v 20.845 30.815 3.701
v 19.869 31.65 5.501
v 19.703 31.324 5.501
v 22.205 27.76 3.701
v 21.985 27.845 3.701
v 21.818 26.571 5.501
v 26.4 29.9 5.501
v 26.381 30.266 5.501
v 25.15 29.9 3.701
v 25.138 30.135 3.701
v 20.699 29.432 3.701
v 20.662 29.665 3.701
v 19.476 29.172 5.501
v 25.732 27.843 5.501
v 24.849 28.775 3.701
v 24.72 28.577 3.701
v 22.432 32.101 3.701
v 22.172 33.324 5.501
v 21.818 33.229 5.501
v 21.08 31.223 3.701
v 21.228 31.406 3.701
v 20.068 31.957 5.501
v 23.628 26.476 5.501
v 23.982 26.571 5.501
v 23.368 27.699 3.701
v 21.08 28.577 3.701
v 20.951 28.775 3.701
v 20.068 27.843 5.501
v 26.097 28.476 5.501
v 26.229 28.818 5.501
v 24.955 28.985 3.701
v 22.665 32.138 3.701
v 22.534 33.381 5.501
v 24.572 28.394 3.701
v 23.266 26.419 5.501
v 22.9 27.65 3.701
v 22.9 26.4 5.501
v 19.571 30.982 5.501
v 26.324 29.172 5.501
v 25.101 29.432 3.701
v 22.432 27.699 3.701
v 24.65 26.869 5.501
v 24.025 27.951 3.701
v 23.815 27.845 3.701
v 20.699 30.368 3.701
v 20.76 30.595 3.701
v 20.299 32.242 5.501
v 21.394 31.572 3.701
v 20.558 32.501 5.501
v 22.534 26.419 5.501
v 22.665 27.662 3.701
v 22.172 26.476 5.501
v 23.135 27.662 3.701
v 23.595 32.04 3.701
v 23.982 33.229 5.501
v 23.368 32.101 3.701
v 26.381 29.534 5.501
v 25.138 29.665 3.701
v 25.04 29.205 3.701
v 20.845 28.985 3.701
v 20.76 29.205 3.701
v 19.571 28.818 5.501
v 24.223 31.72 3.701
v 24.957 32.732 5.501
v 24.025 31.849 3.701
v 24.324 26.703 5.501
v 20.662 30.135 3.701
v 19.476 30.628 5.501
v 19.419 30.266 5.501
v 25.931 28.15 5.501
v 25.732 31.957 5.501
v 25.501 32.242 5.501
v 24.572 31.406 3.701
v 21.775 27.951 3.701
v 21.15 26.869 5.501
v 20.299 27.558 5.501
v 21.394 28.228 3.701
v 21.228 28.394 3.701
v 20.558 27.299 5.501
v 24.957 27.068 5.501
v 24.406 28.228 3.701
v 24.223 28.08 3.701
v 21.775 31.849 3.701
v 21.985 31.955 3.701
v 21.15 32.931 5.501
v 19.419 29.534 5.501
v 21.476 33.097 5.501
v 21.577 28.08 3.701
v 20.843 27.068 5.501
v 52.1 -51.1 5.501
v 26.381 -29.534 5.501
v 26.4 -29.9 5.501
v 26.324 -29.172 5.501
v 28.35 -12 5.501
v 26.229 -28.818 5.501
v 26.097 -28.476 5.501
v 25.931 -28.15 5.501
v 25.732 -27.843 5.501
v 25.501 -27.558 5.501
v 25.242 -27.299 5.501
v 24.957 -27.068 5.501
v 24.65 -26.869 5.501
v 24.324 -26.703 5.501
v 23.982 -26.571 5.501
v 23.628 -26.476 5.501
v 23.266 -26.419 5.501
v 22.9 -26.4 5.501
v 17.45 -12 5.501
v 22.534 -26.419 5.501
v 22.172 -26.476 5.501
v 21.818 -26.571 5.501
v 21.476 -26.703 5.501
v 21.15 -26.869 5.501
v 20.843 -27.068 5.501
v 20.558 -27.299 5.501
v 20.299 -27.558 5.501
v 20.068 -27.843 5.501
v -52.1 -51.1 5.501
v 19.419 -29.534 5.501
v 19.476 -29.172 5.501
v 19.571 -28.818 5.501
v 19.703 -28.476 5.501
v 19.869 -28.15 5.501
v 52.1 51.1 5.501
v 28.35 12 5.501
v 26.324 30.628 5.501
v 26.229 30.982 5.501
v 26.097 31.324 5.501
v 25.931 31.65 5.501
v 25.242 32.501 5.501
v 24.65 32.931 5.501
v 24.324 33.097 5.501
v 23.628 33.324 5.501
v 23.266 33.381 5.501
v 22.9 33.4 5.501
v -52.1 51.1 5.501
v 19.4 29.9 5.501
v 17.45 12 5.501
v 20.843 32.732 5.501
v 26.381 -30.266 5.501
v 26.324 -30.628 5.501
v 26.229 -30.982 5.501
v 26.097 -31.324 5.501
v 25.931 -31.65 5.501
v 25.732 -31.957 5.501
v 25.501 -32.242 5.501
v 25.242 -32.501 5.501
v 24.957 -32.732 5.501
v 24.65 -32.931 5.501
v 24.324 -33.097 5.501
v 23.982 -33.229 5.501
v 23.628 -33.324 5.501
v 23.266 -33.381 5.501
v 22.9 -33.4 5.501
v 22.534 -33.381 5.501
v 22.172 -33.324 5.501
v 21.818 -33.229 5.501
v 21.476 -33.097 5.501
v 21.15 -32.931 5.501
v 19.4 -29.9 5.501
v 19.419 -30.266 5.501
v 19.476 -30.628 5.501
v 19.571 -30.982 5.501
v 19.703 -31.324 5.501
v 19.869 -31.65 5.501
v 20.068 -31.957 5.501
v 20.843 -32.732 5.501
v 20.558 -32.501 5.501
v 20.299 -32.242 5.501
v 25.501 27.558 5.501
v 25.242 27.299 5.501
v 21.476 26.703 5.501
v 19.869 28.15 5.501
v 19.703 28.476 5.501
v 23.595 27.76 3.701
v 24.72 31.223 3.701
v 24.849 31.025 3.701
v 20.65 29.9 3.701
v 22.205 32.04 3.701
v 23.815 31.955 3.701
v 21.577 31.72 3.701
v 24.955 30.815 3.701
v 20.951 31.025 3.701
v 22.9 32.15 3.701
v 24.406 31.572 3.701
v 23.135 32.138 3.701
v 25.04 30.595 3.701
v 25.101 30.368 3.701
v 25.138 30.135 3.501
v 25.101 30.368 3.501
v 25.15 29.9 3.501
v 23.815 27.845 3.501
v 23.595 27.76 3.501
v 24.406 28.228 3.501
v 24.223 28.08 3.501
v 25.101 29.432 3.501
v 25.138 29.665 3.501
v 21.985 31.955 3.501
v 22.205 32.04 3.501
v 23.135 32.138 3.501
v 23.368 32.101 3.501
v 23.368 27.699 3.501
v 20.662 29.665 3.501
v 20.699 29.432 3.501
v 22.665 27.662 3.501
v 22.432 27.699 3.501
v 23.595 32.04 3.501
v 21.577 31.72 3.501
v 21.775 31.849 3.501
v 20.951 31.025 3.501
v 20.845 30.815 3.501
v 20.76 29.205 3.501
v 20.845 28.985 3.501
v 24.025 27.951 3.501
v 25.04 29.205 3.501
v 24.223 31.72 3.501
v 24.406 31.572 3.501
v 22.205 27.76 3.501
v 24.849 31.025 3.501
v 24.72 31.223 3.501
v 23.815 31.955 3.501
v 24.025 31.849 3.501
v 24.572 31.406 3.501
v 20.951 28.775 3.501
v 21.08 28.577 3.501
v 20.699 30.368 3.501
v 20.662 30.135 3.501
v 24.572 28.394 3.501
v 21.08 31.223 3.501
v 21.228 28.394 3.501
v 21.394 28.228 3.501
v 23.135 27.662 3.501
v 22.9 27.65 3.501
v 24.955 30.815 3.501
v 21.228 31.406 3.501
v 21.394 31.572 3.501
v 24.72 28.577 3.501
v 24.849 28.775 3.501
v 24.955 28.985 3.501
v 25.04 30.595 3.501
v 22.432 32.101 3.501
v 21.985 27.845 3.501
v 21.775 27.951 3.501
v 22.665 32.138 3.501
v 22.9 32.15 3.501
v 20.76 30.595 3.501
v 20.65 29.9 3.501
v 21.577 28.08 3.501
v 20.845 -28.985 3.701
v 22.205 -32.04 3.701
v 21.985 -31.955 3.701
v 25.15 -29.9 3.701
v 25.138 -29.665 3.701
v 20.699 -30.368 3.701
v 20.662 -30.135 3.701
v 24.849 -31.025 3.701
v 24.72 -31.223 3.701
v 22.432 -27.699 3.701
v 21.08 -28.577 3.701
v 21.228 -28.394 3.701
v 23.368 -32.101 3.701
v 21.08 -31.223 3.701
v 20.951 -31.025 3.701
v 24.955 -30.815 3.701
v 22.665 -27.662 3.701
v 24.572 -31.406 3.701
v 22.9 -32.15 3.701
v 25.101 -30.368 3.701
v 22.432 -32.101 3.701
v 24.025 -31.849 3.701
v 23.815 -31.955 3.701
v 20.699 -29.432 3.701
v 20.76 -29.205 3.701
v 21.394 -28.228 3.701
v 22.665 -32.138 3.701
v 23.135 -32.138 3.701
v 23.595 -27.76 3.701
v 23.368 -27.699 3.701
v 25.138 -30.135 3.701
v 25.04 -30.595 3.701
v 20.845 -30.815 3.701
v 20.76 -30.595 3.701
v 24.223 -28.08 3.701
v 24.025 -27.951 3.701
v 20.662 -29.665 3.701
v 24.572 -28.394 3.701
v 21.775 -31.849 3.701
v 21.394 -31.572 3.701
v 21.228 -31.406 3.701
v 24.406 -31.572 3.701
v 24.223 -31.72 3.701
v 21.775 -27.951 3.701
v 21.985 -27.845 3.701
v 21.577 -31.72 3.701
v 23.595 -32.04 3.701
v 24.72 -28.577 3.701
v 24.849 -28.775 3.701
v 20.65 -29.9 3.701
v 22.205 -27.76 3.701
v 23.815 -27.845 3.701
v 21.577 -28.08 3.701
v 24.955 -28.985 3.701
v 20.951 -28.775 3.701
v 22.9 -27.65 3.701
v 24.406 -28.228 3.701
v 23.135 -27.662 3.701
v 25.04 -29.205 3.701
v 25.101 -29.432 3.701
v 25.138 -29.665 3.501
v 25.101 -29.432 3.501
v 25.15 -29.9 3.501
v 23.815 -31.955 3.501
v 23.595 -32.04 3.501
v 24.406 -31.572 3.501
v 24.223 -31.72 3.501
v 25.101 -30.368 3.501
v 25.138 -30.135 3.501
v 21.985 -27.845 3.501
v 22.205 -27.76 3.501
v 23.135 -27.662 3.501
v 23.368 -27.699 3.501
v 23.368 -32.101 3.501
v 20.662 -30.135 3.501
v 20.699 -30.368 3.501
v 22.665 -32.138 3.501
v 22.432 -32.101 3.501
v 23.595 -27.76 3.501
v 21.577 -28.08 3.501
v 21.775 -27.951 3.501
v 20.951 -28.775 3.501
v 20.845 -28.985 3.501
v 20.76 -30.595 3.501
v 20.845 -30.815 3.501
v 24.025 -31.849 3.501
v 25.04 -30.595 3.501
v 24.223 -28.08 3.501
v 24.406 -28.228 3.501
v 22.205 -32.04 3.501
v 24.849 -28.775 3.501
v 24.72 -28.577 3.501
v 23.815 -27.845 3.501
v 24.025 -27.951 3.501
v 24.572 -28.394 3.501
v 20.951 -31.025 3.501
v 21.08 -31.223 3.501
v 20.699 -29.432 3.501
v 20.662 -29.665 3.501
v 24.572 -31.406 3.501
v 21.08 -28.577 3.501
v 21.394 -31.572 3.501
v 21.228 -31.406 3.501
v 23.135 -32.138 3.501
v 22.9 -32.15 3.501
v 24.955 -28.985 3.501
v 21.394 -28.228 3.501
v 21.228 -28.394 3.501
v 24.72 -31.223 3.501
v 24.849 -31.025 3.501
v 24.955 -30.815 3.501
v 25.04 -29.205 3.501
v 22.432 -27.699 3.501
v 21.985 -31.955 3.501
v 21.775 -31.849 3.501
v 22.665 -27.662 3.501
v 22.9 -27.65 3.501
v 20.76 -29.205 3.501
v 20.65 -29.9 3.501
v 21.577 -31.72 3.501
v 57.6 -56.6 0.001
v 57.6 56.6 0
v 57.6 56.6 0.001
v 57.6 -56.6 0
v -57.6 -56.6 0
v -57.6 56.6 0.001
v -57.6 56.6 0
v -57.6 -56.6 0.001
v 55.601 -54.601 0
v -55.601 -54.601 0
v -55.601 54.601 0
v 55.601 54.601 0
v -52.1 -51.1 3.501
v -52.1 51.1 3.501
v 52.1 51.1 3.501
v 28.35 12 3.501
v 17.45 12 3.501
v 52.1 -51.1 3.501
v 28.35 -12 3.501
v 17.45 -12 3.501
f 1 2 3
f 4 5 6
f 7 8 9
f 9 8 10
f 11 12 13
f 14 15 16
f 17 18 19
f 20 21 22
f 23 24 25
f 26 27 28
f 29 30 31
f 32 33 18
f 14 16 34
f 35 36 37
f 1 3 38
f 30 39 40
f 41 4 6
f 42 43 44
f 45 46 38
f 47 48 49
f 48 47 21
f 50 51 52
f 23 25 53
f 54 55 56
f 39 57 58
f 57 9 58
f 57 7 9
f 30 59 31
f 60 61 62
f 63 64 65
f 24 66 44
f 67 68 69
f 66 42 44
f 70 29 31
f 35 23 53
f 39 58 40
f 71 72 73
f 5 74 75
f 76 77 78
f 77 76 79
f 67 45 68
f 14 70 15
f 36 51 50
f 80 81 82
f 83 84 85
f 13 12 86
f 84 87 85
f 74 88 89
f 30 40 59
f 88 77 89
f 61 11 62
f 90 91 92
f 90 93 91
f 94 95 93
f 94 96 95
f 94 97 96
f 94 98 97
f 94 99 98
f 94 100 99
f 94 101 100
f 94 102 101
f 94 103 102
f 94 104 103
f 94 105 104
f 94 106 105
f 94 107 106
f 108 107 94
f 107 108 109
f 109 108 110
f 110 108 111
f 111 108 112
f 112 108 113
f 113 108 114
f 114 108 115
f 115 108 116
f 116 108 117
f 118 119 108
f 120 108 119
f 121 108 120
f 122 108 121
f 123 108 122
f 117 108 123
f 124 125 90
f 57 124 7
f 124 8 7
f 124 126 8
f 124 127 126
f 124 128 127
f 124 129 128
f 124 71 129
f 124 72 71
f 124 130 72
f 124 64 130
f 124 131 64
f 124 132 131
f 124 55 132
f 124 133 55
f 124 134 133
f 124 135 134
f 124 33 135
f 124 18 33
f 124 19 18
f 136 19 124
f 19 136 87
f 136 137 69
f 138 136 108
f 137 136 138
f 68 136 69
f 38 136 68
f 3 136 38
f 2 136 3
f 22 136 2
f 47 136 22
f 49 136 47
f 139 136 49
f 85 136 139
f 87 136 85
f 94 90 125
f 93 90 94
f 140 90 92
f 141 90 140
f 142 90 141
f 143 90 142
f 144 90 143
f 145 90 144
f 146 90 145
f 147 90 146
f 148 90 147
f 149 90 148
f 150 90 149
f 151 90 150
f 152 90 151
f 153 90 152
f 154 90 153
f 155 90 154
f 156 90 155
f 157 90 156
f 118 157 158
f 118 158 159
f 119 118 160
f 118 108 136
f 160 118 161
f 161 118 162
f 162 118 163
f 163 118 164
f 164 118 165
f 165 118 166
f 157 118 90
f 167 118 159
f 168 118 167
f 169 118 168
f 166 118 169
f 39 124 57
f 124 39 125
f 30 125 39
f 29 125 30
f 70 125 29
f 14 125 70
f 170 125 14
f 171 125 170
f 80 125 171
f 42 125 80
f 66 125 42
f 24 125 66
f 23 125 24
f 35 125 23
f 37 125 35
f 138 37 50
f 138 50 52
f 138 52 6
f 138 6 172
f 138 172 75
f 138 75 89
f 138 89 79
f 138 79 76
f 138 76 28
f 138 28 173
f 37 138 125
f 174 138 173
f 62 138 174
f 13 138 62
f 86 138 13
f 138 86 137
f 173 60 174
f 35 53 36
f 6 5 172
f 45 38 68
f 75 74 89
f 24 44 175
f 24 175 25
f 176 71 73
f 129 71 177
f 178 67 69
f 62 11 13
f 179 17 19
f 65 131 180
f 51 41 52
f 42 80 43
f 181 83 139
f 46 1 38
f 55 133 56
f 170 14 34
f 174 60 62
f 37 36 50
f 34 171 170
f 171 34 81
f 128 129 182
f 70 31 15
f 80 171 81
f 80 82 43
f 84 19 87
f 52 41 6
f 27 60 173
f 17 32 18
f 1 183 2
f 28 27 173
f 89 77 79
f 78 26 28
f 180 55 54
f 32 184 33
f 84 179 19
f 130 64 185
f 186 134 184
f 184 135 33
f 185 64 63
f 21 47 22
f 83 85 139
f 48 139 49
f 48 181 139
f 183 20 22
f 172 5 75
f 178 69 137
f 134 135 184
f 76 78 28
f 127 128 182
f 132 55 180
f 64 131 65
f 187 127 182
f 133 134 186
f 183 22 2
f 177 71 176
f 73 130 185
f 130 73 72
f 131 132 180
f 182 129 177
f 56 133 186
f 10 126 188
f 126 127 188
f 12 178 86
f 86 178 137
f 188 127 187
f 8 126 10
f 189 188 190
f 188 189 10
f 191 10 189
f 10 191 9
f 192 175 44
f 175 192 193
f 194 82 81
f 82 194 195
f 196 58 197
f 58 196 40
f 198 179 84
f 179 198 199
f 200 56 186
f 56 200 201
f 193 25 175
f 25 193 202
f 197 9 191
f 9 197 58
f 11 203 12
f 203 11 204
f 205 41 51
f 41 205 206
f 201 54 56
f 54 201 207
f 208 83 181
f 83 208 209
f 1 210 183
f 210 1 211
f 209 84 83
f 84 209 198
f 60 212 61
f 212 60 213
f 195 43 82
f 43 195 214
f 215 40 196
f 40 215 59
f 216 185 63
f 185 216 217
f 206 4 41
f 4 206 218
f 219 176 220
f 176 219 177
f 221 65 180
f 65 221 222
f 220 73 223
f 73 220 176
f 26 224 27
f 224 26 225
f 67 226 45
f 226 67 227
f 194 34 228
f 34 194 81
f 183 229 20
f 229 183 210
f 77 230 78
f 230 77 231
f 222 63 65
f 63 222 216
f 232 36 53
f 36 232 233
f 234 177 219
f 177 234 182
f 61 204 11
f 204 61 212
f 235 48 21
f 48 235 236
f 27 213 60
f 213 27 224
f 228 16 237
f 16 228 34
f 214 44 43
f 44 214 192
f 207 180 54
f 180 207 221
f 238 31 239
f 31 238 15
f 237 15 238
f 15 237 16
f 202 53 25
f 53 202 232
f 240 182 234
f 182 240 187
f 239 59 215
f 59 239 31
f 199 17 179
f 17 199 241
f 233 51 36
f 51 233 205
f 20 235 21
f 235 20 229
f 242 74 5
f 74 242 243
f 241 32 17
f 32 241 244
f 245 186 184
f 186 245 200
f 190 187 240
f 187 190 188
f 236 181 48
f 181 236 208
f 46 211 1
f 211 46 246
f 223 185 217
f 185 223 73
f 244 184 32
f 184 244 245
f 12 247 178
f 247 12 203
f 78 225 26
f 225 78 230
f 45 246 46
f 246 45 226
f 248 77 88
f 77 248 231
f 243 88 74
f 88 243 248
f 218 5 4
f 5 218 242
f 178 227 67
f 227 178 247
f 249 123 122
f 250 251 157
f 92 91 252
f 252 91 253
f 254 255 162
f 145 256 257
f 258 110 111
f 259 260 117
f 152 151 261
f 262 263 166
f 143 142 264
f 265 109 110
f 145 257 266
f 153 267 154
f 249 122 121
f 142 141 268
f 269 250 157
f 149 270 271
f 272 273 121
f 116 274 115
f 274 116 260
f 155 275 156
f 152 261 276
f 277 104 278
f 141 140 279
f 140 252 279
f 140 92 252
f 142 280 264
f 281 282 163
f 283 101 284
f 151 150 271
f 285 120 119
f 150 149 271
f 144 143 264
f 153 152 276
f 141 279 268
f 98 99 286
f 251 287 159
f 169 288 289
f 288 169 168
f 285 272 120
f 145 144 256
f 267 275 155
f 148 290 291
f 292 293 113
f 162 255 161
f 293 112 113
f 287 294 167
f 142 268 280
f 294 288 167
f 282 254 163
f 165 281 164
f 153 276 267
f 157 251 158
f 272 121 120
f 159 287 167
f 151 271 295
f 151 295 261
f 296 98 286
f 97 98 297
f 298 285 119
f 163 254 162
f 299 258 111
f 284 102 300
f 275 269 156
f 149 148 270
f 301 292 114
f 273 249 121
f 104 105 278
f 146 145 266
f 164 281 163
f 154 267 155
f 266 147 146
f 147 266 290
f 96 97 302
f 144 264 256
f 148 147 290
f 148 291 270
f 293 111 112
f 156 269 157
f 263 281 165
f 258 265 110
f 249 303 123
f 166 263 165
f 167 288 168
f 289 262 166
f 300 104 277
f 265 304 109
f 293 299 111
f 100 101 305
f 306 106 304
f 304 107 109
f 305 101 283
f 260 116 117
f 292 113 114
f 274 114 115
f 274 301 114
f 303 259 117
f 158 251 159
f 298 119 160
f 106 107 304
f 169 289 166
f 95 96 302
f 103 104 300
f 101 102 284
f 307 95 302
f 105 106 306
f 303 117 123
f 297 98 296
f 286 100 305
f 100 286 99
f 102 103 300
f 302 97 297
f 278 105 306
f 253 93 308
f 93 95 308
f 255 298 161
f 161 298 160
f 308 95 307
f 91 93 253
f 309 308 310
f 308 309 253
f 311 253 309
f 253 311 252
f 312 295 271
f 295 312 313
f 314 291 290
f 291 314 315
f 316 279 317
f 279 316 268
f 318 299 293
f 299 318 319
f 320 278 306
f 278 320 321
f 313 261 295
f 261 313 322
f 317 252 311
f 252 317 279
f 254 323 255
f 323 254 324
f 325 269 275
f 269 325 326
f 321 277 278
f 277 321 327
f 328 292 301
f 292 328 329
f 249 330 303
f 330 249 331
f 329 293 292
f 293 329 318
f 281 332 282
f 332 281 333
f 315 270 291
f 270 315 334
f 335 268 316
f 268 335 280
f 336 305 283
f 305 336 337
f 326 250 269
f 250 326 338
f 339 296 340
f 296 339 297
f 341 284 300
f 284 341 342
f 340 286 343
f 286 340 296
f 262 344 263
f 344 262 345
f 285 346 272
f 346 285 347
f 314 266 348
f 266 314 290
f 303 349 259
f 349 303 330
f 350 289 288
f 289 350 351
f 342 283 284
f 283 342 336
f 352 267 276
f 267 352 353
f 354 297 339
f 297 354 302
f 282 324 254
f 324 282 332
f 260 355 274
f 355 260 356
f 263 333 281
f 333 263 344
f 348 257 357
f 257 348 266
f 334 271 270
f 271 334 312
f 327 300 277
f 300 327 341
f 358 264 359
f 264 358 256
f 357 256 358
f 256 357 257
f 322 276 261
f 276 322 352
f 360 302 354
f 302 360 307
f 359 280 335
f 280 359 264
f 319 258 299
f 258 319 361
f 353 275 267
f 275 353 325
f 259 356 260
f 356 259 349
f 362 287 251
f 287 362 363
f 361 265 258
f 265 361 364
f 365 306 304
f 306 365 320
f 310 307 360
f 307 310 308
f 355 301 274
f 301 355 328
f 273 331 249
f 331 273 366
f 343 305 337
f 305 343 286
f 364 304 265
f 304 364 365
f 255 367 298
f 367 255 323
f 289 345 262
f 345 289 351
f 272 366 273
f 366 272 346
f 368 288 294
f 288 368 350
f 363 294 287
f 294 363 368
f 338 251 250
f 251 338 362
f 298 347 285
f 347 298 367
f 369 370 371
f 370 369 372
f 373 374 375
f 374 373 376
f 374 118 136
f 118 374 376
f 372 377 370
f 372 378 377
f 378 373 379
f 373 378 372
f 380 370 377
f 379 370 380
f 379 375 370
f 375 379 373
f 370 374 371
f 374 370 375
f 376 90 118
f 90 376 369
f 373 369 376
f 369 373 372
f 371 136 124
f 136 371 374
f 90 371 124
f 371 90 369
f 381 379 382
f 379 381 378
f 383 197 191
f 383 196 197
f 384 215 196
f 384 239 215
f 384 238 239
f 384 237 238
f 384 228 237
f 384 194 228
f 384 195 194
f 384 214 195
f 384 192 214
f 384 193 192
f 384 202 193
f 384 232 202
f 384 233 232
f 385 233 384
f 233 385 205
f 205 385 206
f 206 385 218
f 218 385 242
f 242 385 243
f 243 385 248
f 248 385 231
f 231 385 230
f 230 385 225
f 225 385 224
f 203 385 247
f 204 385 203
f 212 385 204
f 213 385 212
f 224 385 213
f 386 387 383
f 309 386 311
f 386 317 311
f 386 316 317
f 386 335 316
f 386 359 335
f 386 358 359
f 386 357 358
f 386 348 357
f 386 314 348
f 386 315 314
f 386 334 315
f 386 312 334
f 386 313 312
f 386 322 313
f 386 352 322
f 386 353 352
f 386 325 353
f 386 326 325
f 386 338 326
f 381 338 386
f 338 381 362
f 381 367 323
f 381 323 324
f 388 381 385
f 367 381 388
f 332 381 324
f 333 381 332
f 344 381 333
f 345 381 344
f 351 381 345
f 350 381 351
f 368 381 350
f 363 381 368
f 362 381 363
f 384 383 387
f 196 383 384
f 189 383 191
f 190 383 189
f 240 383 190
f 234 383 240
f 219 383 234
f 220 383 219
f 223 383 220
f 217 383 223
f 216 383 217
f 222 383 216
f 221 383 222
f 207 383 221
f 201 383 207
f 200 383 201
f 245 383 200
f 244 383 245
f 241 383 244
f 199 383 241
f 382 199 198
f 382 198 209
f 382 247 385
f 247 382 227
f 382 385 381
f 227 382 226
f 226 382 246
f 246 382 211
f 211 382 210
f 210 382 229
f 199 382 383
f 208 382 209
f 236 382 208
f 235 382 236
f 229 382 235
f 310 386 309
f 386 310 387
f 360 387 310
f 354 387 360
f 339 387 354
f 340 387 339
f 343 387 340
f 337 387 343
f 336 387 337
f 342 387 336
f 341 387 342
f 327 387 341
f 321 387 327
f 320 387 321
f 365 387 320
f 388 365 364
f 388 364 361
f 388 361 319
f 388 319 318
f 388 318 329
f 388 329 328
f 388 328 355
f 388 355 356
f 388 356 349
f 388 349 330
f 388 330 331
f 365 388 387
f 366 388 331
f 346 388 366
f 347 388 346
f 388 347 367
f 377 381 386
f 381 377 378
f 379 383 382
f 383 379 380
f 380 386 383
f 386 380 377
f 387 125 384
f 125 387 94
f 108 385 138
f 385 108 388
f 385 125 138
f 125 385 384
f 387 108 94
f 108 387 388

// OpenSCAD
// Light switch cover (body parameters)
cover_w=115.2; // Cover width
cover_l=113.2; // Cover length
cover_h=5.5; // Cover height
cover_thick=2; // Cover thickness
grad_dist=cover_h; // Edge taper distance

// Switch hole parameters
switch_hole_l=10.9; // Switch hole length
switch_hole_w=24.0; // Switch hole width
switch_hole_sep=34.9; // Dist between switch holes

// Screw hole parameters
screw_dist_from_hole_top=14.4; // Dist from top of switch hole
screw_hole_rad_upper=7.0/2; // Upper screw radius
screw_hole_rad_lower=4.5/2; // Lower screw radius
screw_grad_dist=1.8; // Screw inset distance

module wantCube(l, w, h) {
    translate([-w/2,-l/2,0])
        cube([w, l, h]);
}

module wantRect(l, w) {
    translate([-l/2,-w/2,0])
    square([l, w]);
}

module switch_body() {
    hull() {
        wantCube(cover_l, cover_w, 0.001);
        translate([0,0,cover_h])
        wantCube(cover_l-2*grad_dist, cover_w-2*grad_dist, 0.001);
    }
}

module switch_hole() {
    wantCube(switch_hole_w, switch_hole_l, 30);
}

module switch_holes() {
    x=switch_hole_sep/2+switch_hole_l/2;
    translate([x,0,-15])
        switch_hole();
    //translate([-x,0,-15])
    //    switch_hole();
}

module screw_hole() {
    union() {
        translate([0,0,cover_h-screw_grad_dist+0.001])
            cylinder(h=screw_grad_dist, r2=screw_hole_rad_upper, r1=screw_hole_rad_lower, $fn=60);
        translate([0,0,cover_h-20])
            cylinder(h=20, r=screw_hole_rad_lower, $fn=60);
    }
}

module screw_holes() {
    y=screw_dist_from_hole_top+screw_hole_rad_upper+switch_hole_w/2;
    x=switch_hole_sep/2+switch_hole_l/2;
    translate([x,y,0])
        screw_hole();
    //translate([-x,y,0])
    //    screw_hole();
    translate([x,-y,0])
        screw_hole();
    //translate([-x,-y,0])
    //    screw_hole();
}

module switch_cover_final() {
    difference() {
        switch_body();
        translate([0,0,-cover_thick])
            switch_body();
        screw_holes();
        switch_holes();
    }
}

switch_cover_final();
